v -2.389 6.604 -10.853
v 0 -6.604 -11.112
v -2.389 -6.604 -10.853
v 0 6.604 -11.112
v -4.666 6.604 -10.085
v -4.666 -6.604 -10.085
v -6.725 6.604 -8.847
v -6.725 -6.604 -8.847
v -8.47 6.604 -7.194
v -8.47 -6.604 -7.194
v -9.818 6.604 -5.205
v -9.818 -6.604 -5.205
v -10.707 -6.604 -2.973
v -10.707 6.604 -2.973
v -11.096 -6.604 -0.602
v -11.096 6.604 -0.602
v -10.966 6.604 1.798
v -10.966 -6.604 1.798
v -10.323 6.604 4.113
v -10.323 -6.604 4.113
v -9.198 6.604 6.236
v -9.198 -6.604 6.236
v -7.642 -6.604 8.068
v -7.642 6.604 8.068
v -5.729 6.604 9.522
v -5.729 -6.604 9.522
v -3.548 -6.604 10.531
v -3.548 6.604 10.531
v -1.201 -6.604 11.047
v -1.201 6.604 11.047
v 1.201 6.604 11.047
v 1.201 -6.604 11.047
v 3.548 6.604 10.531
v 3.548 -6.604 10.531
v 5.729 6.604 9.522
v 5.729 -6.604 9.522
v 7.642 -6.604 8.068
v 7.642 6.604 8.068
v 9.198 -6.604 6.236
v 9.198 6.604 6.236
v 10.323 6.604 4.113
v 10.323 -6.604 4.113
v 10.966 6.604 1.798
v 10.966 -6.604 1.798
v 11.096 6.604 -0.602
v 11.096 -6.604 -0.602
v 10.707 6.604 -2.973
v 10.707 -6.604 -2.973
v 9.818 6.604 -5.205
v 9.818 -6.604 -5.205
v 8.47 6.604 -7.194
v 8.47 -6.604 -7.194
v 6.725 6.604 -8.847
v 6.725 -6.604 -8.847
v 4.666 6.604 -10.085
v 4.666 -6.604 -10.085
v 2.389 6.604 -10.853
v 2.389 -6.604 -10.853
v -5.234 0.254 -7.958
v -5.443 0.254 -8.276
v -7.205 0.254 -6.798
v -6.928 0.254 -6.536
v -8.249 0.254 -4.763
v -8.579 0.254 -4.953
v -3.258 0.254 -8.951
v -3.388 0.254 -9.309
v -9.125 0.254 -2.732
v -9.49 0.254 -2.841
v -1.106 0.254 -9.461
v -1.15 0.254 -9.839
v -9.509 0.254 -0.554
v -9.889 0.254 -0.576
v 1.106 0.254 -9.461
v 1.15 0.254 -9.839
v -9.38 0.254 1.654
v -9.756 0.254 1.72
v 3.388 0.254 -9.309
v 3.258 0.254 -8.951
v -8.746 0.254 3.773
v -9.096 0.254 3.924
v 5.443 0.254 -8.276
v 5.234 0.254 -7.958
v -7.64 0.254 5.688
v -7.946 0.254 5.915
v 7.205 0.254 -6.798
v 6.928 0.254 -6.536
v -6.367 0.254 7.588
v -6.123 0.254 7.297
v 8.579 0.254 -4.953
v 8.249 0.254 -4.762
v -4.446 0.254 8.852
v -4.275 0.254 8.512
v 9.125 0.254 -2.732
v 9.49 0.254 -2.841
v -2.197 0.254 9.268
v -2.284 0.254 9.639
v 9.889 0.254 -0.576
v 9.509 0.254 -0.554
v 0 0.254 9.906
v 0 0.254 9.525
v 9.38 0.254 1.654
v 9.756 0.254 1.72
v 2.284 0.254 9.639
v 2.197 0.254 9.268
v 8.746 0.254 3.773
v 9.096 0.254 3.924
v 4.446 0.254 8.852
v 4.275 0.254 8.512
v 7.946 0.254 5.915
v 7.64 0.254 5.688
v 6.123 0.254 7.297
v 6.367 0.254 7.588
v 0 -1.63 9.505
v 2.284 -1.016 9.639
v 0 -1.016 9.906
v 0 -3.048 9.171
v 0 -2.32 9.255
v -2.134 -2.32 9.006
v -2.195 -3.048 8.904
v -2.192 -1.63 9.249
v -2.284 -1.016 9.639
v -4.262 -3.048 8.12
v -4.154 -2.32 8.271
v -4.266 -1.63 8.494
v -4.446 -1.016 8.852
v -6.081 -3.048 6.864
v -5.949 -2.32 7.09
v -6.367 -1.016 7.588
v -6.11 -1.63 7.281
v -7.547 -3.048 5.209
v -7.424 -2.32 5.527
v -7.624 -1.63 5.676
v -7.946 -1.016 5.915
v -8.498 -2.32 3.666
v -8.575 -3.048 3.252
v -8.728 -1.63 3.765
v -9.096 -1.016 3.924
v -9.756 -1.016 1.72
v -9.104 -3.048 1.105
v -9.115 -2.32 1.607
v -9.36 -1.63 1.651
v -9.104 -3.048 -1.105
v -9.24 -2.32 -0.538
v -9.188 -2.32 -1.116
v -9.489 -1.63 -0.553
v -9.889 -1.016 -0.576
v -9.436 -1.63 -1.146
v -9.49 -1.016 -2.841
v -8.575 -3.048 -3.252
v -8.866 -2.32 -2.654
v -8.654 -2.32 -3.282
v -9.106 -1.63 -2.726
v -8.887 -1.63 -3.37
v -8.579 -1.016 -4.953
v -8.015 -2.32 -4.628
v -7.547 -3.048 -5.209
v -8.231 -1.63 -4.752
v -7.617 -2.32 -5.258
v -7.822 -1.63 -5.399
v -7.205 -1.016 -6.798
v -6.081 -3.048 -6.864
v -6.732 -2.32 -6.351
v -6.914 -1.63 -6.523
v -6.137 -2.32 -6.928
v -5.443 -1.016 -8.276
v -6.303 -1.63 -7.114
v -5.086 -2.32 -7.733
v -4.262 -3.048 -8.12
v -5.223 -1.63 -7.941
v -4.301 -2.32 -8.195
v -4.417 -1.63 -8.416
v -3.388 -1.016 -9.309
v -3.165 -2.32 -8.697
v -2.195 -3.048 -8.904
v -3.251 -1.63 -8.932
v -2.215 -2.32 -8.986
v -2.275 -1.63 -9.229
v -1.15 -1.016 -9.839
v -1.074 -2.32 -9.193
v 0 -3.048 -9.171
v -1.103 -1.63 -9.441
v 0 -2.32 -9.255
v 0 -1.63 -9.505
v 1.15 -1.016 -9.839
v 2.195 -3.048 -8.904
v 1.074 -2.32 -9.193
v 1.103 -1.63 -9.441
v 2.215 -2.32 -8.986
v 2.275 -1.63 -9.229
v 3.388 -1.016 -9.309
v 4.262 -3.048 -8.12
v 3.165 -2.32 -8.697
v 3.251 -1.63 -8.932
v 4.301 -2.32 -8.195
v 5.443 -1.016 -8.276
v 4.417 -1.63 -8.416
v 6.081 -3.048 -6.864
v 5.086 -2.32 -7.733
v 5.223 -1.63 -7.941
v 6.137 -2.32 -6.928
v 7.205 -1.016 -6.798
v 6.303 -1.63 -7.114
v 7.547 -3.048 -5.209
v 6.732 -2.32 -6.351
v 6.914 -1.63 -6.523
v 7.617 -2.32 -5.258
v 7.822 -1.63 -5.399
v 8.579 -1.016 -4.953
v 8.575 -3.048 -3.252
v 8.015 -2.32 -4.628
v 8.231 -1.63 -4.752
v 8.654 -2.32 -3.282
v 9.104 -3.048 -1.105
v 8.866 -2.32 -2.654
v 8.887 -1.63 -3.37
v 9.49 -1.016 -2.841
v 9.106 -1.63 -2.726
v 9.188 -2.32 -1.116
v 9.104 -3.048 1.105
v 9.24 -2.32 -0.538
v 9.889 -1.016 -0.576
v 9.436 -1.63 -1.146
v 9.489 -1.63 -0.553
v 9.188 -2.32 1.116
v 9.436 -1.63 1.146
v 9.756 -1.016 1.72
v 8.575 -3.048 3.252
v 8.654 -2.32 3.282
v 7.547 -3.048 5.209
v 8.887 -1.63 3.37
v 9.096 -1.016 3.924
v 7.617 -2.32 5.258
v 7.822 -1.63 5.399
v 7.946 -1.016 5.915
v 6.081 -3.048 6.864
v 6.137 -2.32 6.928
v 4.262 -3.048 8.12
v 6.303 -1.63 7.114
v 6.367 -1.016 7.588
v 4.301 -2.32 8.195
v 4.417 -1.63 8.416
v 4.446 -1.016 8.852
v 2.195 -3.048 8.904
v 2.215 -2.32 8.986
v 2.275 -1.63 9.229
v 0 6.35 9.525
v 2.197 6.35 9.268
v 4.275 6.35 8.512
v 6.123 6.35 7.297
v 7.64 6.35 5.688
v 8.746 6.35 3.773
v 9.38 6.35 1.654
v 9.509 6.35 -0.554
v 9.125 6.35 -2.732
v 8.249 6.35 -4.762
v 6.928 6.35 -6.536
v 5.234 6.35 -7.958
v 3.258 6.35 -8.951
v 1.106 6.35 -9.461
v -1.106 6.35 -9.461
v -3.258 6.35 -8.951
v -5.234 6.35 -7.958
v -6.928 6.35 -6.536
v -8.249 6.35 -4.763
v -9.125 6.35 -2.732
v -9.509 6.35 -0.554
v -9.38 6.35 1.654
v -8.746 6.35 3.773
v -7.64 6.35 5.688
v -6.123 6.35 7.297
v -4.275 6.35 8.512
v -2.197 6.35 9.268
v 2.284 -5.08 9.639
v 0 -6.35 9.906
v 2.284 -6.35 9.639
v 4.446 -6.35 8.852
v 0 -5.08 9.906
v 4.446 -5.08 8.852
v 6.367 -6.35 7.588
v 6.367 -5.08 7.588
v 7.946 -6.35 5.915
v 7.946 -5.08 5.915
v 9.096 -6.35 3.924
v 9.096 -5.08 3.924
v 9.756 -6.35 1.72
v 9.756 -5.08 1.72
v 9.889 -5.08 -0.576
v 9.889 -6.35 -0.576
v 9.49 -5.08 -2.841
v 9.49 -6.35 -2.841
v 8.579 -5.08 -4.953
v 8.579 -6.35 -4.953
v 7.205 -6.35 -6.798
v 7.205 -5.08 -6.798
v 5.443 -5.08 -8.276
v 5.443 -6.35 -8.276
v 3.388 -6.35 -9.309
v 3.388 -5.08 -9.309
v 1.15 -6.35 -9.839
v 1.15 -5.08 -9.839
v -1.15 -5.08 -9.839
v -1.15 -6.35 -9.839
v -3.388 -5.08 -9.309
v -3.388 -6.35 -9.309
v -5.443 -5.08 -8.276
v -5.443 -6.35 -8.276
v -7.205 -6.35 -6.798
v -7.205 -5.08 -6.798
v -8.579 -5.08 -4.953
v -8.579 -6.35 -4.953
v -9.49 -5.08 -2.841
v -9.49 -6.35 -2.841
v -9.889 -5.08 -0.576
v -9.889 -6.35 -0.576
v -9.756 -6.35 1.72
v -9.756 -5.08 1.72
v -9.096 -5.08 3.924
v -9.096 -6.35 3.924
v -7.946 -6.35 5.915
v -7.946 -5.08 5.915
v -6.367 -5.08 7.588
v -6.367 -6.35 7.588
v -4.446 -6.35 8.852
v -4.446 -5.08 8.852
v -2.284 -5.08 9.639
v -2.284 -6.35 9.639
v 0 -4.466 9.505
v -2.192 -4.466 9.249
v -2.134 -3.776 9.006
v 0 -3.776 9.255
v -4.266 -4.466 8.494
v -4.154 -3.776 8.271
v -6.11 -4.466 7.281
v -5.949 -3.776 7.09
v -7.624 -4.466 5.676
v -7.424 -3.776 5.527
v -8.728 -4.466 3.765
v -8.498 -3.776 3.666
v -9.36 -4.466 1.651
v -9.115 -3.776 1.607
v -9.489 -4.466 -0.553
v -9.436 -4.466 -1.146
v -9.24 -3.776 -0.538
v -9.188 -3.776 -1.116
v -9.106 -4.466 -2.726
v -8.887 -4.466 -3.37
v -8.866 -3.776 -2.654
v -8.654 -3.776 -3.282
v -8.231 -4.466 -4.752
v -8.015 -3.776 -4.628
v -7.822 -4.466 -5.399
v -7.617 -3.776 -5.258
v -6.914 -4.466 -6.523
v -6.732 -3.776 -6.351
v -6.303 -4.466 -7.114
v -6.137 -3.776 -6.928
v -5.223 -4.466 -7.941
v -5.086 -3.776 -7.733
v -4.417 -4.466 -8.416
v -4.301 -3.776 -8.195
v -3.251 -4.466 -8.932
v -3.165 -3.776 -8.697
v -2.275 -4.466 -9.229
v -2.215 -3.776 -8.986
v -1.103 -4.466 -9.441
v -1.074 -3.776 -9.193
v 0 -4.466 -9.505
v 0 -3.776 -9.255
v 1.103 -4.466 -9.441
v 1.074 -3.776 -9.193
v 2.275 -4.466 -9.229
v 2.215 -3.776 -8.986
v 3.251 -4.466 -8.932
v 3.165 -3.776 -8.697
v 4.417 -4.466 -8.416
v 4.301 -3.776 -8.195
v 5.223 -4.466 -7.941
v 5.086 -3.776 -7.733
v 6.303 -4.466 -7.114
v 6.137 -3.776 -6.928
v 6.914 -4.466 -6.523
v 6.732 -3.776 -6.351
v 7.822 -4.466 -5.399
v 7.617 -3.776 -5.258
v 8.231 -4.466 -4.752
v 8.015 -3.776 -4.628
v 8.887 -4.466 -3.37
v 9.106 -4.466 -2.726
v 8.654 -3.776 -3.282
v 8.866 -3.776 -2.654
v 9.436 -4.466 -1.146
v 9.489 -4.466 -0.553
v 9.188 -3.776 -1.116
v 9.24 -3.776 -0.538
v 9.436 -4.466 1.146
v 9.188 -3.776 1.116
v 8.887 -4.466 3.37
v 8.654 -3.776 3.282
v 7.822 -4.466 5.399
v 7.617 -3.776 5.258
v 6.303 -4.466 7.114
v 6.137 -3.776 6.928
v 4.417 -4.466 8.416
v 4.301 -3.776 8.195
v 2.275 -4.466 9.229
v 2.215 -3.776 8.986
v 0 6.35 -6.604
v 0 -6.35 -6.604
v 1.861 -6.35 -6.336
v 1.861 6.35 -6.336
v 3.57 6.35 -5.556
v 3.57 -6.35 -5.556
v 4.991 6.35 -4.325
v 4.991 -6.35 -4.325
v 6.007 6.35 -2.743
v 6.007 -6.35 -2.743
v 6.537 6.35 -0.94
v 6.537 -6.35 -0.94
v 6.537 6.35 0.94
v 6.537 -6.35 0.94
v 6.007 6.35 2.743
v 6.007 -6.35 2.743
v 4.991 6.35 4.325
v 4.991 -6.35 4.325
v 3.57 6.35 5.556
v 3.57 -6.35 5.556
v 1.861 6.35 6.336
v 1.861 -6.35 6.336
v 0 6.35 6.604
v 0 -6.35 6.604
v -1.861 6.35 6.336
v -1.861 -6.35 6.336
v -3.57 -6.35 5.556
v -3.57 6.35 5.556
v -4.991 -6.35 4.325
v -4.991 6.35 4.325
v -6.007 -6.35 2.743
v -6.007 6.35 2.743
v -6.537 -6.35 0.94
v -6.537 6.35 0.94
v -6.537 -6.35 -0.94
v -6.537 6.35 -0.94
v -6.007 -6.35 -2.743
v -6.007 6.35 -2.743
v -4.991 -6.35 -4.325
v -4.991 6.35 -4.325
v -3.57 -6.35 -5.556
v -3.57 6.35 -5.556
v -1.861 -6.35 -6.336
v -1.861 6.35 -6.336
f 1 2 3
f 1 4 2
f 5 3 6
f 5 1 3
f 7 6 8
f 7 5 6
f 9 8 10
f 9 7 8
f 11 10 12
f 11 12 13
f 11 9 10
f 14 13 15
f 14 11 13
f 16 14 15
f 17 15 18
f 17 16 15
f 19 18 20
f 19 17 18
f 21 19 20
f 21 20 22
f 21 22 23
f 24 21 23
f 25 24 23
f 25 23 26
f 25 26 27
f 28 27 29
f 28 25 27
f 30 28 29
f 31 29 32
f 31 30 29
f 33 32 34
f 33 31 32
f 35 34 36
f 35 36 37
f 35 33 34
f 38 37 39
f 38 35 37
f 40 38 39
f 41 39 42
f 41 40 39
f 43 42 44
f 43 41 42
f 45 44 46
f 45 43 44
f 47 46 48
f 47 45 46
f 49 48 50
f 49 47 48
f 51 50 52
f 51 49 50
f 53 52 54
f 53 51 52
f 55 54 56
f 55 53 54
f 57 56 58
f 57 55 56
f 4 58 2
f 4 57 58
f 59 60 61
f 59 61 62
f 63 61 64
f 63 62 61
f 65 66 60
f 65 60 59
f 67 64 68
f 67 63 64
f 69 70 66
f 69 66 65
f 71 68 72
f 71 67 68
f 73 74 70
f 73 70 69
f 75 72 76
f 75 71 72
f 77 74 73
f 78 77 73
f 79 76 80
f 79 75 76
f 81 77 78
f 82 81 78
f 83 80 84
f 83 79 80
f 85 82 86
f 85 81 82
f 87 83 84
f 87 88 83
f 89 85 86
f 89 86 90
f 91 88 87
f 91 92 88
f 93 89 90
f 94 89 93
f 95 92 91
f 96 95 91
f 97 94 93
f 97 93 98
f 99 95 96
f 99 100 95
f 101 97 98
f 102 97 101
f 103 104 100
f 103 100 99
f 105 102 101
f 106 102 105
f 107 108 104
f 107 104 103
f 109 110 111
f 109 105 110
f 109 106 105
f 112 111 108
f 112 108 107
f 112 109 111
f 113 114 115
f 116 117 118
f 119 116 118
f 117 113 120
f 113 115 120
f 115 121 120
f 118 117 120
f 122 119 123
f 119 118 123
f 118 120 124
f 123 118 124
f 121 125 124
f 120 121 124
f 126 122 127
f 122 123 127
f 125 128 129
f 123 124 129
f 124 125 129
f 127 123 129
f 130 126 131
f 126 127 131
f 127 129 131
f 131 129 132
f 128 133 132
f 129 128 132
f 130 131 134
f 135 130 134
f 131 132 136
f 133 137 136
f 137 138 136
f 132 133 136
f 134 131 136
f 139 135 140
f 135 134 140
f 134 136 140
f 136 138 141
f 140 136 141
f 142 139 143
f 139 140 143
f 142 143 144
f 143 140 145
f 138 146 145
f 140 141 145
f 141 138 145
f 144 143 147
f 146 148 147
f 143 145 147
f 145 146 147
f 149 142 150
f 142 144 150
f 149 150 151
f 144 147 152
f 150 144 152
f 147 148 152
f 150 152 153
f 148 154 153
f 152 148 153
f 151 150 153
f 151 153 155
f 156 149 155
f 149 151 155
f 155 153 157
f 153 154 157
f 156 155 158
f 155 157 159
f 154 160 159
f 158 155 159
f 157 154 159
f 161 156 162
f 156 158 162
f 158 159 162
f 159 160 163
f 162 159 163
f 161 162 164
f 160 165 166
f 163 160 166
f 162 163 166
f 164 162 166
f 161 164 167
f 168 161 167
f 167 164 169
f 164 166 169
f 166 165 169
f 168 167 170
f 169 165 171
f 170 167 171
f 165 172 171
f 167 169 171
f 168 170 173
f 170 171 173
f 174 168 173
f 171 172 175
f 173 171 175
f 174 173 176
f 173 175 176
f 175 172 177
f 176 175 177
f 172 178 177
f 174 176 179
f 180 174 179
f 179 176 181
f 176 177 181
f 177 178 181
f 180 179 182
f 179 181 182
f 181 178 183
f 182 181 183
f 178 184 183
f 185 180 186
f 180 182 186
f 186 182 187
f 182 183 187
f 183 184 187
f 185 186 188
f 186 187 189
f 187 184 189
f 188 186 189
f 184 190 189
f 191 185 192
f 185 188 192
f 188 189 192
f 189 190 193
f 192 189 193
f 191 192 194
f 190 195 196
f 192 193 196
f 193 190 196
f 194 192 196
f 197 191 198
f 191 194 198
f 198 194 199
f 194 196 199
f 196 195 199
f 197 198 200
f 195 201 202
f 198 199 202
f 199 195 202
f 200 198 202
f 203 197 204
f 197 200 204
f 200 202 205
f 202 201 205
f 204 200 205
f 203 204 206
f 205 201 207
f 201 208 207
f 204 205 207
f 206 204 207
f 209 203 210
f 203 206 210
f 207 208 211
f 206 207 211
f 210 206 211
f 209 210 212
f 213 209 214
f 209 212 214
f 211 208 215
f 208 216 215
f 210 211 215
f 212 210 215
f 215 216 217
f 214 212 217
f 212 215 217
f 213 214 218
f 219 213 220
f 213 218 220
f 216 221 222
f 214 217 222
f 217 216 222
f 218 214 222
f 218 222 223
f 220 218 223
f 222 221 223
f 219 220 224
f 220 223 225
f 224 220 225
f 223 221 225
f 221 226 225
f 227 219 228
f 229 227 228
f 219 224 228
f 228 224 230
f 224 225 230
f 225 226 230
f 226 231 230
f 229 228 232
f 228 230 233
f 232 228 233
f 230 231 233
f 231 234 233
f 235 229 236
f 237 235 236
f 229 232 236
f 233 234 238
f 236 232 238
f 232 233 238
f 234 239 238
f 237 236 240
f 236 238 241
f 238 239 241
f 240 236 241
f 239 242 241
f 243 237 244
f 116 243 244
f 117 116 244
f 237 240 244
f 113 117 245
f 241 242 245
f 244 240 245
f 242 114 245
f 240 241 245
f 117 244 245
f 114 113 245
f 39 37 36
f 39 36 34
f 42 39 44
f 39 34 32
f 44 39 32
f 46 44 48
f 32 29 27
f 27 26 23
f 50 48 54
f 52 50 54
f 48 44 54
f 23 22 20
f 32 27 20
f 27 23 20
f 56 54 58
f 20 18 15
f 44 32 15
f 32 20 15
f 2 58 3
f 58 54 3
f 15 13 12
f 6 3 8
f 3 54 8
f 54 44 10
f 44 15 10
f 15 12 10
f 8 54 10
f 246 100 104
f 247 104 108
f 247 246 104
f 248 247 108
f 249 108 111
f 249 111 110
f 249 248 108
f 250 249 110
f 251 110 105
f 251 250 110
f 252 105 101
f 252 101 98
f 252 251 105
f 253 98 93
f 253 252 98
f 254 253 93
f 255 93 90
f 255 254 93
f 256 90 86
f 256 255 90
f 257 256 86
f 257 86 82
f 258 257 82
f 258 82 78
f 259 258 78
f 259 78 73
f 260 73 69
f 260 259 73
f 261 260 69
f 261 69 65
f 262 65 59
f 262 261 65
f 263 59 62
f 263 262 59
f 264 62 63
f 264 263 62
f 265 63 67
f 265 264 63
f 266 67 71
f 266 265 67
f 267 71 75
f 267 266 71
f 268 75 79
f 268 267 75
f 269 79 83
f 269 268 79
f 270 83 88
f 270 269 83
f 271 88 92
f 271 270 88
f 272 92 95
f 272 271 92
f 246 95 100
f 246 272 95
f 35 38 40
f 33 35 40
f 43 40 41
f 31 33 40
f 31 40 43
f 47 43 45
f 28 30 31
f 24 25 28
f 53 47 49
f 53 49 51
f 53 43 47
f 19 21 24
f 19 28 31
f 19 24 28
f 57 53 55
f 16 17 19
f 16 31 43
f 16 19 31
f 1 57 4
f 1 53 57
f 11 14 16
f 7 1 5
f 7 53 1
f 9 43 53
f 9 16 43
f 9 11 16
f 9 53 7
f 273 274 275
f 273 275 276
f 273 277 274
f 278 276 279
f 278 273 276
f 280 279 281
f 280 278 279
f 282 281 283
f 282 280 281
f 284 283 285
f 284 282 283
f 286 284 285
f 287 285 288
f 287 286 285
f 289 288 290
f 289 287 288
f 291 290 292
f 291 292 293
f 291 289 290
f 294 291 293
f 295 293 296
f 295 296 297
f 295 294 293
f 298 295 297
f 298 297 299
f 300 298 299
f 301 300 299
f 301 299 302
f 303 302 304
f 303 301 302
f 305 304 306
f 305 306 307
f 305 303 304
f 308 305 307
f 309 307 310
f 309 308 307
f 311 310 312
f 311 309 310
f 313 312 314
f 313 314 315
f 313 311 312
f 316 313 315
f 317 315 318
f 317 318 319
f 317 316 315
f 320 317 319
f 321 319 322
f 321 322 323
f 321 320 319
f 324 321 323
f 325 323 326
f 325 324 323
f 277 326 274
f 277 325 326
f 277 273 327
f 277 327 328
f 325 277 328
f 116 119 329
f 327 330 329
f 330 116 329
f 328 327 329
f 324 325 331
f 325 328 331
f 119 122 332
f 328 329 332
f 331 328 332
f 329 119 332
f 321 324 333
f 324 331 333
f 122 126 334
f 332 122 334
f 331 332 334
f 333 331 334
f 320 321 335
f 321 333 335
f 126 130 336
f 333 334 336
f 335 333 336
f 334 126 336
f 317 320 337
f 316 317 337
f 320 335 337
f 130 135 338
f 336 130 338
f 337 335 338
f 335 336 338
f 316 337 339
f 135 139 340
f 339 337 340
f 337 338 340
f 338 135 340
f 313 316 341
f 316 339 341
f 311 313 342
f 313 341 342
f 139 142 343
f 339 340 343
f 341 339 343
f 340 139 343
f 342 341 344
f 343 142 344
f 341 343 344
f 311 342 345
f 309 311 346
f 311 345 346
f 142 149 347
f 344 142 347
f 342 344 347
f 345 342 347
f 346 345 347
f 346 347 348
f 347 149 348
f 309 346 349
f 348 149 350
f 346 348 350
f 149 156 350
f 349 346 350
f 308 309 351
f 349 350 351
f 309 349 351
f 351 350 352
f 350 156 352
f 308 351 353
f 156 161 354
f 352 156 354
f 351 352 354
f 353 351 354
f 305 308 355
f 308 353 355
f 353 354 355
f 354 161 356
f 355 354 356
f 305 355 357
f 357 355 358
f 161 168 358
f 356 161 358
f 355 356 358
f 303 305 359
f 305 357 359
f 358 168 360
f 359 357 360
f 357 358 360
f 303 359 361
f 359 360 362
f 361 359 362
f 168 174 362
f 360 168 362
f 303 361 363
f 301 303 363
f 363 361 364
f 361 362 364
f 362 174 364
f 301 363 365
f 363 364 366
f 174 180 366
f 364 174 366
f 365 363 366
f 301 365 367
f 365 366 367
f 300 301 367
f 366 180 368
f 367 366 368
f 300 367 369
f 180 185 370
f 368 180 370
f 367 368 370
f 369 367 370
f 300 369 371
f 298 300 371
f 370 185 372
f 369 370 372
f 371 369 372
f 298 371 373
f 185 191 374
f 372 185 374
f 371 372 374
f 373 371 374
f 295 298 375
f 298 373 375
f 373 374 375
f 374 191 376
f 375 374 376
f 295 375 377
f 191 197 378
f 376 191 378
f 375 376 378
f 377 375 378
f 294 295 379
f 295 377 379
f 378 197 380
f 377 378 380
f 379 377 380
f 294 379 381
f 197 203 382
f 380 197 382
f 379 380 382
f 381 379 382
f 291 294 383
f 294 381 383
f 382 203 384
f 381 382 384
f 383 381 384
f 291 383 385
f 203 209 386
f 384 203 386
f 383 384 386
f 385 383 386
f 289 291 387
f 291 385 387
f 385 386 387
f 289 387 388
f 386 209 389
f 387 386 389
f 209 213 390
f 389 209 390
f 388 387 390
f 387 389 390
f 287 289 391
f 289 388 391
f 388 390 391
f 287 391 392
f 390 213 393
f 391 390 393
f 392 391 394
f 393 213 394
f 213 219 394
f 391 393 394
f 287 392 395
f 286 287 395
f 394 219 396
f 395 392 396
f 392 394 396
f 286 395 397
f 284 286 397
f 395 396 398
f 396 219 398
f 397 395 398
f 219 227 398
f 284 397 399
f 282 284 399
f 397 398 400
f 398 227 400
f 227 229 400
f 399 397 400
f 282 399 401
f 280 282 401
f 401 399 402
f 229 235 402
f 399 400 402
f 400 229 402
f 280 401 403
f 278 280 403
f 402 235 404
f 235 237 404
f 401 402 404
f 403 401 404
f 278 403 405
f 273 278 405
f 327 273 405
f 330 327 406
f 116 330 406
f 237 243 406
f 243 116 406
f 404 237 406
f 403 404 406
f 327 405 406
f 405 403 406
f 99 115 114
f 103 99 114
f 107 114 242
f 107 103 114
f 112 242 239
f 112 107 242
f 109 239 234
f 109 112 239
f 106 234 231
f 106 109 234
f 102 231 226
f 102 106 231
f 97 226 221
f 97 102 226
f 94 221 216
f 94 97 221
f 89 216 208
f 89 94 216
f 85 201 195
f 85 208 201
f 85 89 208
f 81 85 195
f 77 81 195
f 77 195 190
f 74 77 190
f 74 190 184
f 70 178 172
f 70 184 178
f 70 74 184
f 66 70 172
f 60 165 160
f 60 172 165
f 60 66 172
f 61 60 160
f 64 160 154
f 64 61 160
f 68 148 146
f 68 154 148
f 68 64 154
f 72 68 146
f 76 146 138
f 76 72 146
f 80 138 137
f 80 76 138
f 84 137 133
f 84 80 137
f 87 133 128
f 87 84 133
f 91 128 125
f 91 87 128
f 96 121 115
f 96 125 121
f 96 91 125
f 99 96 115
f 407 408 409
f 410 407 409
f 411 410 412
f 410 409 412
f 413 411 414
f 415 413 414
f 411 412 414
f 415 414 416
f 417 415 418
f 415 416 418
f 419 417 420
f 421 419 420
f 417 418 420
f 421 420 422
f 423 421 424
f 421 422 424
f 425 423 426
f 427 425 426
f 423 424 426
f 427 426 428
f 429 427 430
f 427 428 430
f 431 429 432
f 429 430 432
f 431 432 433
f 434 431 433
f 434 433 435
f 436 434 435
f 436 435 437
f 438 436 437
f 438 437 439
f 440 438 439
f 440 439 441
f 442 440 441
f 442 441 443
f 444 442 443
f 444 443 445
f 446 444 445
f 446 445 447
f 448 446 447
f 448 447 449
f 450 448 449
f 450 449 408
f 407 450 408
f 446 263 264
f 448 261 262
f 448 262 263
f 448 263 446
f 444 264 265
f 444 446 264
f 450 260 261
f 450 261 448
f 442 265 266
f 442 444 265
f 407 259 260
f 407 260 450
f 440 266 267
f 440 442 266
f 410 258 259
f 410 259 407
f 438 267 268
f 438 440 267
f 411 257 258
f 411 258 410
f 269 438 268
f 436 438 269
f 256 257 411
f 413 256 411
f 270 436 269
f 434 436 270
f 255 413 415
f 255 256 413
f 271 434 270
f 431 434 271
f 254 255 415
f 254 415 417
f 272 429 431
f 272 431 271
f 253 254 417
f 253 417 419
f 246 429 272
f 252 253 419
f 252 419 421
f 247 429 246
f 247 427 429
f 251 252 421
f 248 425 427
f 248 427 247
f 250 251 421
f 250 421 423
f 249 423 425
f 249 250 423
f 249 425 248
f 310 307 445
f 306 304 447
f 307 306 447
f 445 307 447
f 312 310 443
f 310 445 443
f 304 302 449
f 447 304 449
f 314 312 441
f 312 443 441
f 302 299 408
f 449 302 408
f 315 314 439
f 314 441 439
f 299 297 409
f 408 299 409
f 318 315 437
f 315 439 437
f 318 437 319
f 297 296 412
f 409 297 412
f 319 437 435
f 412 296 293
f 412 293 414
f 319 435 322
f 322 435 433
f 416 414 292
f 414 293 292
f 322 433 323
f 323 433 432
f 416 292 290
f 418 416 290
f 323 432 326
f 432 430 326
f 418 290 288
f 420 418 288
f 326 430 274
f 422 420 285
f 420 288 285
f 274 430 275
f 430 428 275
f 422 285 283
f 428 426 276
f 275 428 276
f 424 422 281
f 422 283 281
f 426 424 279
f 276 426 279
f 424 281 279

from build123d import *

# Parameters (mm, degrees)
SKETCH1_R           = 11.1125
BOSS_EXTRUDE1_DEPTH = 6.604
SKETCH2_R           = 9.906
BOSS_EXTRUDE2_DEPTH = 6.35
SKETCH3_R           = 9.906
SKETCH3_R_2         = 9.525
CUT_EXTRUDE1_DEPTH  = 6.096
SKETCH5_R           = 3.175
SKETCH6_R           = 6.604
CUT_EXTRUDE3_DEPTH  = 21.366183454


with BuildPart() as part:
    # Sketch1 → Boss-Extrude1 (new, symmetric)
    with BuildSketch(Plane(origin=(0, 0, 0), x_dir=(1, 0, 0), z_dir=(0, 1, 0))):
        with Locations(Location((0, 0, 0), (0, 0, 90))):
            Circle(SKETCH1_R)
    extrude(amount=BOSS_EXTRUDE1_DEPTH, both=True)


with BuildPart() as body_2:
    # Sketch2 → Boss-Extrude2 (new, symmetric)
    with BuildSketch(Plane(origin=(0, 0, 0), x_dir=(1, 0, 0), z_dir=(0, 1, 0))):
        with Locations(Location((0, 0, 0), (0, 0, 270))):
            Circle(SKETCH2_R)
    extrude(amount=BOSS_EXTRUDE2_DEPTH, both=True)

    # Sketch3 → Cut-Extrude1 (cut)
    with BuildSketch(Plane(origin=(0, 6.35, 0), x_dir=(1, 0, 0), z_dir=(0, 1, 0))):
        with Locations(Location((0, 0, 0), (0, 0, 270))):
            Circle(SKETCH3_R)
        with Locations(Location((0, 0, 0), (0, 0, 270))):
            Circle(SKETCH3_R_2, mode=Mode.SUBTRACT)
    extrude(amount=-CUT_EXTRUDE1_DEPTH, mode=Mode.SUBTRACT)

    # Sketch5 → Cut-Revolve1 (revolve, cut)
    with BuildSketch(Plane.XY, mode=Mode.PRIVATE) as cut_revolve1_sk:
        with Locations((-12.345590334, -3.048)):
            Circle(SKETCH5_R)
    revolve(cut_revolve1_sk.sketch.rotate(Axis((0, 0.254, 0), (0, -1, 0)), 270), axis=Axis((0, 0.254, 0), (0, -1, 0)), mode=Mode.SUBTRACT)

    # Sketch6 → Cut-Extrude3 (cut, through all)
    with BuildSketch(Plane.XZ.offset(6.35)):
        with Locations(Location((0, 0, 0), (0, 0, 270))):
            Circle(SKETCH6_R)
    extrude(amount=-CUT_EXTRUDE3_DEPTH, mode=Mode.SUBTRACT)


solid = Compound([part.part, body_2.part])
